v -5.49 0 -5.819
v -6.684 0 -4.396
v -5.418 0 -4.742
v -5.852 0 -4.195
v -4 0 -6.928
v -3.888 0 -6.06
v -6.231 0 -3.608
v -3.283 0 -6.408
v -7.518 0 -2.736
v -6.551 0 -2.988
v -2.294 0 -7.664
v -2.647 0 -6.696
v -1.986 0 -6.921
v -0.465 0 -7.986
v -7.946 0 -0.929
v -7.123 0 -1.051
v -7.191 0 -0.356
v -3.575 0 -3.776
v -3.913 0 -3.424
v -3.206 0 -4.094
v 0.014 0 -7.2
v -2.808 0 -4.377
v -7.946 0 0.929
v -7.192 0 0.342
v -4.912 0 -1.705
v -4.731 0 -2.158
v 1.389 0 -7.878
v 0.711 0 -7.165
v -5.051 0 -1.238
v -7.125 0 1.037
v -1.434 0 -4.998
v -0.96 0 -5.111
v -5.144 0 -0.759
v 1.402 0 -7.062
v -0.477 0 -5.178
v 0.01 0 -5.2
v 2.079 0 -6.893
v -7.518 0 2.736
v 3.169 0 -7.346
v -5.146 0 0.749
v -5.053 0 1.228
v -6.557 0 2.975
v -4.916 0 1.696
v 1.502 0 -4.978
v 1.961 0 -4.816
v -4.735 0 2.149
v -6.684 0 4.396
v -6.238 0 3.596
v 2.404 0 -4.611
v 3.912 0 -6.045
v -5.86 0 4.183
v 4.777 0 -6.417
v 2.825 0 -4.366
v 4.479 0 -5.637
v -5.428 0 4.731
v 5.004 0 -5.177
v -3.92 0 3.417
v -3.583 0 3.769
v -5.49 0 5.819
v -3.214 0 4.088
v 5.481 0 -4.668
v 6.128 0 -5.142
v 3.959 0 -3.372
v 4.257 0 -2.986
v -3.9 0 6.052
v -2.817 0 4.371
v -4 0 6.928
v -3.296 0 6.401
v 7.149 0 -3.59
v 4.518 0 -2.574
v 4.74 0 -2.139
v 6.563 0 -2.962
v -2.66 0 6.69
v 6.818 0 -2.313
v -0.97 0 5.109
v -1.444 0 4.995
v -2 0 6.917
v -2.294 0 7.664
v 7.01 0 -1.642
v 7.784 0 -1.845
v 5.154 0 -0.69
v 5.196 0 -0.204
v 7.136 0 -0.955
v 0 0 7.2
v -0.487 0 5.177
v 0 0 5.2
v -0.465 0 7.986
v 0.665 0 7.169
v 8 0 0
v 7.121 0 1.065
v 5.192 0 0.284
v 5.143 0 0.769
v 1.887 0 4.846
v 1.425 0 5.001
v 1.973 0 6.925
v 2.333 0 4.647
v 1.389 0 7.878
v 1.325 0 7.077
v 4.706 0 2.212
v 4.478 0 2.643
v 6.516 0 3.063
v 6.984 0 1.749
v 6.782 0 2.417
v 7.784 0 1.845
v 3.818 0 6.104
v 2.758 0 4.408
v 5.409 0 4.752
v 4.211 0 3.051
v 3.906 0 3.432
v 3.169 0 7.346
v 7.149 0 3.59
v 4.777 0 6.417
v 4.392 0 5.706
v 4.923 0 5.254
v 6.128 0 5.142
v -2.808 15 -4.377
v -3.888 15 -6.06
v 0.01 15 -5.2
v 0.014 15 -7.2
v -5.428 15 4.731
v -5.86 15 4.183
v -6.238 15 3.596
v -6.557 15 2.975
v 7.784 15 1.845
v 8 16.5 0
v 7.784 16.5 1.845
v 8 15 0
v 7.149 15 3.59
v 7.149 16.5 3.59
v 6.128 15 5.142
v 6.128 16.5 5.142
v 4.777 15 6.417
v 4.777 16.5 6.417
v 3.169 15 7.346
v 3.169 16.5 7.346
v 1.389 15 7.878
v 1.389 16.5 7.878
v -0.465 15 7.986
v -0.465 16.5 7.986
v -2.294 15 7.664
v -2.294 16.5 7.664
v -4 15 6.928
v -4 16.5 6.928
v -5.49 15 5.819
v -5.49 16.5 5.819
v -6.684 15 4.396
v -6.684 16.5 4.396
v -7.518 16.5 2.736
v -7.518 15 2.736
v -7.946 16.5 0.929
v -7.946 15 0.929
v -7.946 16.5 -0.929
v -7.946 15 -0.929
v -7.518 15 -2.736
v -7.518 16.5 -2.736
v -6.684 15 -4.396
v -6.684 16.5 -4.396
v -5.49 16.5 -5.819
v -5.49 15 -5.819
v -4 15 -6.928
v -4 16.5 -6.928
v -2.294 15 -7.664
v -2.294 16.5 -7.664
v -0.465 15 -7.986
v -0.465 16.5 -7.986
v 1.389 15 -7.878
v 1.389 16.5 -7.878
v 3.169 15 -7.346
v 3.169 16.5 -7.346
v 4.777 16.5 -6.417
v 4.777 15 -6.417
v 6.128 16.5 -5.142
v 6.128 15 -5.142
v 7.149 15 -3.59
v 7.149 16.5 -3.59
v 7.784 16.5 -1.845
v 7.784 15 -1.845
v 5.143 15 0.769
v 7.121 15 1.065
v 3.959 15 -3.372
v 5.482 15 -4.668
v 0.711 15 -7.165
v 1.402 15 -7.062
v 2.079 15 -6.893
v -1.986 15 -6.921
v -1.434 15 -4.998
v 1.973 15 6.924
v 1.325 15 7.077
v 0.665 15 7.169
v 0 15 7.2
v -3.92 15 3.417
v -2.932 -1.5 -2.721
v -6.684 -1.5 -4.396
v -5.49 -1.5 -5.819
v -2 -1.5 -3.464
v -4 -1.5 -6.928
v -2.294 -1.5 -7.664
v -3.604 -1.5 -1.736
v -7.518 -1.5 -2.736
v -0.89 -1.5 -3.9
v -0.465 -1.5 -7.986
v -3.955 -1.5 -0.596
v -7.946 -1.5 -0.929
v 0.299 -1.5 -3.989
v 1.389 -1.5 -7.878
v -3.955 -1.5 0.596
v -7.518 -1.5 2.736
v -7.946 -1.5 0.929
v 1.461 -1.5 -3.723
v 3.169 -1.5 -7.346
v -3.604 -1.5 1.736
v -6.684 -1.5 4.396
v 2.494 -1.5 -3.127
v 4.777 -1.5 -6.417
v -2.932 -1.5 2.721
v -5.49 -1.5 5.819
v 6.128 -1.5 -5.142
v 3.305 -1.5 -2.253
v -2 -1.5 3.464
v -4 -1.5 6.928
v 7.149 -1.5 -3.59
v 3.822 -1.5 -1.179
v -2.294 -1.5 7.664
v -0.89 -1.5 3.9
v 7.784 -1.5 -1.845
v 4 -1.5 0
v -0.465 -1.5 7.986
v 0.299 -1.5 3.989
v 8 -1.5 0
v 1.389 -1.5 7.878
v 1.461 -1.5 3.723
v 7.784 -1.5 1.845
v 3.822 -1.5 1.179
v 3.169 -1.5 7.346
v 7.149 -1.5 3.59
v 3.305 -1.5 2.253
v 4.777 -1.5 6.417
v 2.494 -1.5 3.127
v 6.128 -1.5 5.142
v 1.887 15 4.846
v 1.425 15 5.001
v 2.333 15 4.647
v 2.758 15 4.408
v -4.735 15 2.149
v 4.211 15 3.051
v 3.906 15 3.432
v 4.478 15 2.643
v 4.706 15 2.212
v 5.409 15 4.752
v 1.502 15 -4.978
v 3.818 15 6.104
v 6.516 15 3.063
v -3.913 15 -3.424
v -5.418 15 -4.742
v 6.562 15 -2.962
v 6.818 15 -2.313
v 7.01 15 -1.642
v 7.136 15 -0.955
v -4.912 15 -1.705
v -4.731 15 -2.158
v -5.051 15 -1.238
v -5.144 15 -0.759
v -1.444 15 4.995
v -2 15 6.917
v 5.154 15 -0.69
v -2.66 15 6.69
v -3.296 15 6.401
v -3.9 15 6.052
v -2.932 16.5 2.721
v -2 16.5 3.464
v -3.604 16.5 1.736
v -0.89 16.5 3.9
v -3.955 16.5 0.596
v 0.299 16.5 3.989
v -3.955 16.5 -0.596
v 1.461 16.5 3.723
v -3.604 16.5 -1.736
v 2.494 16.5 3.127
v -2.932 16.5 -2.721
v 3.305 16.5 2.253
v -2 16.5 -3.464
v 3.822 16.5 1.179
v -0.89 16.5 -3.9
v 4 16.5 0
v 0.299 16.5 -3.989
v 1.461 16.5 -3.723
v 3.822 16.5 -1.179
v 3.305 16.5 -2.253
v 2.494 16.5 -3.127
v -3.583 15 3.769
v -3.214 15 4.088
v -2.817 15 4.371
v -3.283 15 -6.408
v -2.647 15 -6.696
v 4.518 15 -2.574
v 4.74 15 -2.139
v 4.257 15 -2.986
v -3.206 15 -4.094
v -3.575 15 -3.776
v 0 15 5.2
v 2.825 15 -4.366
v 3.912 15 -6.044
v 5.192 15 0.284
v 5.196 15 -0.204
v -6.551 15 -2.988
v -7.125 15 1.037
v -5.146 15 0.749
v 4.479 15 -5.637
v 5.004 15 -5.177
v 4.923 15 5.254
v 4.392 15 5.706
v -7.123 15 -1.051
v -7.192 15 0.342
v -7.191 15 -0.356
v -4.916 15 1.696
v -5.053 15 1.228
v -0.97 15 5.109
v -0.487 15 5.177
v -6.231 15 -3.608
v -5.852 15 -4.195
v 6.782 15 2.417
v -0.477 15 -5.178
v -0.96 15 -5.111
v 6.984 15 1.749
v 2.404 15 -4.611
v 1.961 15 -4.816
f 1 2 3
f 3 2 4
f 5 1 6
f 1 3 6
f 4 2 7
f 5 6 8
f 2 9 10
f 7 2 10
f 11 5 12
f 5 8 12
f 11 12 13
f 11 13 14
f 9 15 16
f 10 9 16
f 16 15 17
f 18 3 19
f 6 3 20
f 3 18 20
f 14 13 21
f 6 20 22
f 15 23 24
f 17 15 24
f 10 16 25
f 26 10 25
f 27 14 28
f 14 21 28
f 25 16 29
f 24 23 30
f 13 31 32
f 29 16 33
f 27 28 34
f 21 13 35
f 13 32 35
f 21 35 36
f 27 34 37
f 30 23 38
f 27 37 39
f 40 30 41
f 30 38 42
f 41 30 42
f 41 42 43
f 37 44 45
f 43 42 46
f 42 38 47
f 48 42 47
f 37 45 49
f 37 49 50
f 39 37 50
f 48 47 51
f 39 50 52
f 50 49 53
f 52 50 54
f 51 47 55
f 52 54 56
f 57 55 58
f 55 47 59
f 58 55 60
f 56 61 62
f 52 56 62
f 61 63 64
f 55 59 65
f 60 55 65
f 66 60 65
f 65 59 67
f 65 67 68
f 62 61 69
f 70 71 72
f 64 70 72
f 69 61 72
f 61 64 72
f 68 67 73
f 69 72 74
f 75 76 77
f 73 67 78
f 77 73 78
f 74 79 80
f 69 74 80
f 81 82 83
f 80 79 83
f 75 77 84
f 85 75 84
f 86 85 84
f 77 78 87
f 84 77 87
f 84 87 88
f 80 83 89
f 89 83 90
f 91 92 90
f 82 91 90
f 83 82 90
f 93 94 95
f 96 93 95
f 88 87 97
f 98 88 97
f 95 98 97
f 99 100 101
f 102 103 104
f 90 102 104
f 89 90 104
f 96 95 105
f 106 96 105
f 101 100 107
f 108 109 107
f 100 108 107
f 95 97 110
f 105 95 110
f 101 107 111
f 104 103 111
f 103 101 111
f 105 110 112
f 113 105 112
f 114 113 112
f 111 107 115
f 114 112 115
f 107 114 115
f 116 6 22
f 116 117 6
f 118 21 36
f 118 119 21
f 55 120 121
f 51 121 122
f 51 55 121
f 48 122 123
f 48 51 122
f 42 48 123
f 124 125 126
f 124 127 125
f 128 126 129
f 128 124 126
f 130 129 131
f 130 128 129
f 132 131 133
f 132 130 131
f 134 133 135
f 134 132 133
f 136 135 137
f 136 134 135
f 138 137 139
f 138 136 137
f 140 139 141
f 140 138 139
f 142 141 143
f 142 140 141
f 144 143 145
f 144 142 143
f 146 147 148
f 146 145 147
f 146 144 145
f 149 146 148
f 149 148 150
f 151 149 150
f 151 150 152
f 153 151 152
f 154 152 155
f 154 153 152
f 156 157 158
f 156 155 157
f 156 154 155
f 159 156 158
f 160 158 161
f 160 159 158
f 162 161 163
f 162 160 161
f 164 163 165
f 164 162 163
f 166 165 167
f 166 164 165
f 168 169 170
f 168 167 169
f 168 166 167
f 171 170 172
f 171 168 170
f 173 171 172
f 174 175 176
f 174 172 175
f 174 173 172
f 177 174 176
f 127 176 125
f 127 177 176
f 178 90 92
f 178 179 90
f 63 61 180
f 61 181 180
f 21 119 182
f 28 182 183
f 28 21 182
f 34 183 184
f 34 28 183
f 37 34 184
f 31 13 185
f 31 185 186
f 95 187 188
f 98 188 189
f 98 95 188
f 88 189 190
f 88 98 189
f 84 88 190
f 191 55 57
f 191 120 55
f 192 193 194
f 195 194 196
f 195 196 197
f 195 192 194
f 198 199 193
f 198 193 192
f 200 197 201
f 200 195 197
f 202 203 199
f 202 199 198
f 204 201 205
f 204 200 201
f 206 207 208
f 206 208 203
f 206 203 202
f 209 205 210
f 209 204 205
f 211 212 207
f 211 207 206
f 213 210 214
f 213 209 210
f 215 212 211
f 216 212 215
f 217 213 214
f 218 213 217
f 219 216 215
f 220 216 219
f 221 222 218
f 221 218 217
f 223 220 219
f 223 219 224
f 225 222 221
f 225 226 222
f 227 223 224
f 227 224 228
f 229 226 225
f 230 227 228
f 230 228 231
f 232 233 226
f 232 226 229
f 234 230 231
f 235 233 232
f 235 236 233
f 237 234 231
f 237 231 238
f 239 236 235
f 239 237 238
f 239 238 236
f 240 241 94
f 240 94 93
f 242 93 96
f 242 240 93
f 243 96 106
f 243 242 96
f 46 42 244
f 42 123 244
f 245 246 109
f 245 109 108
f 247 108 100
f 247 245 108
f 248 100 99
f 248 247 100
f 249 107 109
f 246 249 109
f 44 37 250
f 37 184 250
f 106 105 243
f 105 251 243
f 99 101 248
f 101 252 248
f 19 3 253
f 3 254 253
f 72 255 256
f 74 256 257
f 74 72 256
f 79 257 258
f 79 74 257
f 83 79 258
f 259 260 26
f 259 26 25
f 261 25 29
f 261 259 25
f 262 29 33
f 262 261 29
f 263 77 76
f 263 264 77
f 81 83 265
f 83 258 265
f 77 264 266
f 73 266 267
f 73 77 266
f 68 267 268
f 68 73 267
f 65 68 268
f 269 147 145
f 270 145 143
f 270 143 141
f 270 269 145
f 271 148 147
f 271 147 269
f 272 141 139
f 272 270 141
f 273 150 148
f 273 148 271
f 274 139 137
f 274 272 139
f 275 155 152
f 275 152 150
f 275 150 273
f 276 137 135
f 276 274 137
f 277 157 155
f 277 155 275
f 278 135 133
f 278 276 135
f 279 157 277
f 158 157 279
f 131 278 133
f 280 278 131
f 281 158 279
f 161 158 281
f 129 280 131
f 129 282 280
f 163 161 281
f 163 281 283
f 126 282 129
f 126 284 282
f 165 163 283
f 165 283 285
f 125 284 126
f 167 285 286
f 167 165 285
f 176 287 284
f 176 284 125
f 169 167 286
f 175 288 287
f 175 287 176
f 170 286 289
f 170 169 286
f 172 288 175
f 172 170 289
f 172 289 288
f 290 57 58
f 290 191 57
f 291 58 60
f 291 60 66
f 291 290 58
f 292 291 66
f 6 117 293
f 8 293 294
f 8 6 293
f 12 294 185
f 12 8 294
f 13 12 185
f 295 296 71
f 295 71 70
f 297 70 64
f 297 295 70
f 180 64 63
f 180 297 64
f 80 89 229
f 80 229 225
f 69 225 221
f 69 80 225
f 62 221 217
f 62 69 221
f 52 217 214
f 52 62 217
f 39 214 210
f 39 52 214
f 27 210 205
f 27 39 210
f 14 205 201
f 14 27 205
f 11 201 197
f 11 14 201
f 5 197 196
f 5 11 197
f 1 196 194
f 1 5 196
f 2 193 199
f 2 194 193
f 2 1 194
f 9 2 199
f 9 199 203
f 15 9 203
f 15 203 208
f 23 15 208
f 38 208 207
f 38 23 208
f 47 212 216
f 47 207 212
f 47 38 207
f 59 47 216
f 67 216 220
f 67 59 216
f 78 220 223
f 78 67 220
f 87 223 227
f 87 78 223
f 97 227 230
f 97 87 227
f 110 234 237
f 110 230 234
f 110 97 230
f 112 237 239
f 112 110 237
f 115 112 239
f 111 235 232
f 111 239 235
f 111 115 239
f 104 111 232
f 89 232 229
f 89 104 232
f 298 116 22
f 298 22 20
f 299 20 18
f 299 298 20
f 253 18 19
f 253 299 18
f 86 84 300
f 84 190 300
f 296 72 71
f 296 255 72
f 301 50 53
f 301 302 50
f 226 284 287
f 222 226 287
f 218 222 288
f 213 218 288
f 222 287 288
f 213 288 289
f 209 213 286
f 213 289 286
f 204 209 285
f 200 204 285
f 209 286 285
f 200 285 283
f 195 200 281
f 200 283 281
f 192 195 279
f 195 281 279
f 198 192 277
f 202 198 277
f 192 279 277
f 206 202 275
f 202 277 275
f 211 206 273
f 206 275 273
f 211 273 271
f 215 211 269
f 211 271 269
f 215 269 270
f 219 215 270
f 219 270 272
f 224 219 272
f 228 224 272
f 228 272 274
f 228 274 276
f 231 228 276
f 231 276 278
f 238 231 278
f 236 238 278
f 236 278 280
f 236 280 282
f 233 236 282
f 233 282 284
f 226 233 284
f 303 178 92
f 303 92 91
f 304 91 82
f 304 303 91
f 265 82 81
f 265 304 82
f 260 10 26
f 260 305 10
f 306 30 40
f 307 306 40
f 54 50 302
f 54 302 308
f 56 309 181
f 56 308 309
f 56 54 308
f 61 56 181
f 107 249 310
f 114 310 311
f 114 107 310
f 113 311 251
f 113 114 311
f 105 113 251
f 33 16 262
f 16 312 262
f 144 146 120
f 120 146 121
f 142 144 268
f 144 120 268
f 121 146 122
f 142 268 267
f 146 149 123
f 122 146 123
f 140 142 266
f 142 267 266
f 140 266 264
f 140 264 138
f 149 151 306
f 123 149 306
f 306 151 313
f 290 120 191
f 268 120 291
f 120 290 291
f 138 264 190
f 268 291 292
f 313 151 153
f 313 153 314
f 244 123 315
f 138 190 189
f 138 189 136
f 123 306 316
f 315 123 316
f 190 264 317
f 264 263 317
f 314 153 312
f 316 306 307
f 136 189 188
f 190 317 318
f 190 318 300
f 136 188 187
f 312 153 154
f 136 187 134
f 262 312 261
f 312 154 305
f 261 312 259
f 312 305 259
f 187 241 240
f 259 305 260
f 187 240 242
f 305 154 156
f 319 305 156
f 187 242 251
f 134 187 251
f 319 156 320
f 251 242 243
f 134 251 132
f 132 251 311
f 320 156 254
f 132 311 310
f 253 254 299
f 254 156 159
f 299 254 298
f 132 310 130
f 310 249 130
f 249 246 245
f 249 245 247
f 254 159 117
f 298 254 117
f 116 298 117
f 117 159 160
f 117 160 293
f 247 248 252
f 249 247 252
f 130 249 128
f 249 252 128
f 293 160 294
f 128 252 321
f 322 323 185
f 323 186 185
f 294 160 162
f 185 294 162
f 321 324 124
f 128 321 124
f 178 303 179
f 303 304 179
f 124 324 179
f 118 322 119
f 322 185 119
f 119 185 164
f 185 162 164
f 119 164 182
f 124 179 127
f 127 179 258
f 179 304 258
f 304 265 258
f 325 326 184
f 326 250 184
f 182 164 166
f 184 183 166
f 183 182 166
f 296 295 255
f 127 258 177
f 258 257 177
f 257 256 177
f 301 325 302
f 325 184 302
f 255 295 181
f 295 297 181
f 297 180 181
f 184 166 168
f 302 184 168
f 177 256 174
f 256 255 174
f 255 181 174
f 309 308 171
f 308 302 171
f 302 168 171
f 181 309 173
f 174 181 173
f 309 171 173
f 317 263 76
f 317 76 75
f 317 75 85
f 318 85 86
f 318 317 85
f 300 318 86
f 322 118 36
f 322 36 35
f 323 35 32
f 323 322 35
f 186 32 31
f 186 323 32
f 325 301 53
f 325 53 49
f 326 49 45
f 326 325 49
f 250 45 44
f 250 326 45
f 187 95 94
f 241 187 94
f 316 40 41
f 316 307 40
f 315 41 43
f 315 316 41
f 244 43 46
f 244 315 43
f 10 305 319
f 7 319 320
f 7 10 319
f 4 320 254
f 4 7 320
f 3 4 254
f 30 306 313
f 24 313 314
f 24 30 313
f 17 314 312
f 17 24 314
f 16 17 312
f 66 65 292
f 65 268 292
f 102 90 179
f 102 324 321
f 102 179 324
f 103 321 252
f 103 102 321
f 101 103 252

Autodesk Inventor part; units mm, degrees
ref_plane "YZ Plane" through (0, 0, 0) normal (1, 0, 0) x (0, 1, 0)
ref_plane "XZ Plane" through (0, 0, 0) normal (0, 1, 0) x (-1, 0, 0)
ref_plane "XY Plane" through (0, 0, 0) normal (0, 0, 1) x (1, 0, 0)
sketch "Esquisse2" plane through (0, 0, 0) normal (0, 1, 0) x (-1, 0, 0)
  circle A0 centre (0, 0) radius 7.2
  dimension "d0" = 14.4
extrude "Extrusion1" add sketch "Esquisse2" along normal blind 15
sketch "Esquisse4" plane through (0, 15, 0) normal (0, 1, 0) x (1, 0, 0)
  circle A0 centre (0, 0) radius 7.2 projected
  circle A1 centre (0, 0) radius 7.2 projected
  arc A2 (-2, -6.9166) -> (0, -7.2) centre (0, 0) ccw
  arc A3 (-1.4444, -4.9954) -> (0, -5.2) centre (0, 0) ccw
  line L0 (-2, -6.9166) -> (-1.4444, -4.9954)
  line L1 (0, -7.2) -> (0, -5.2)
  line L2 (0, 0) -> (-4.1531, -9.129)
  arc A4 (-5.4277, -4.7308) -> (-3.9, -6.0523) centre (0, 0) ccw
  arc A5 (-3.92, -3.4167) -> (-2.8167, -4.3711) centre (0, 0) ccw
  line L3 (-3.9, -6.0523) -> (-2.8167, -4.3711)
  line L4 (-5.4277, -4.7308) -> (-3.92, -3.4167)
  line L5 (0, -6) -> (0, 5.5969) construction
  line L6 (0, 0) -> (-5.5895, -3.594)
  arc A6 (-6.5507, 2.988) -> (-7.1229, 1.0507) centre (0, 0) ccw
  arc A7 (-4.7311, 2.158) -> (-5.1443, 0.7589) centre (0, 0) ccw
  line L7 (-7.1229, 1.0507) -> (-5.1443, 0.7589)
  line L8 (-6.5507, 2.988) -> (-4.7311, 2.158)
  arc A8 (-7.125, -1.0366) -> (-6.5566, -2.975) centre (0, 0) ccw
  arc A9 (-5.1458, -0.7487) -> (-4.7353, -2.1486) centre (0, 0) ccw
  line L9 (-7.125, -1.0366) -> (-5.1458, -0.7487)
  line L10 (-6.5566, -2.975) -> (-4.7353, -2.1486)
  line L11 (-2, -6.9166) -> (-3.9, -6.0523) construction
  line L12 (-5.4277, -4.7308) -> (-6.5566, -2.975) construction
  line L13 (-2, -6.9166) -> (0, -7.2) construction
  line L14 (0, 0) -> (-5.7368, 3.7048)
  arc A10 (-3.888, 6.06) -> (-5.4183, 4.7415) centre (0, 0) ccw
  line L15 (-5.4183, 4.7415) -> (-3.9132, 3.4244)
  line L16 (-3.888, 6.06) -> (-2.808, 4.3767)
  arc A11 (-2.808, 4.3767) -> (-3.9132, 3.4244) centre (0, 0) ccw
  line L17 (-1.9863, 6.9206) -> (-1.4345, 4.9982)
  arc A12 (0.0143, 7.2) -> (-1.9863, 6.9206) centre (0, 0) ccw
  arc A13 (0.0103, 5.2) -> (-1.4345, 4.9982) centre (0, 0) ccw
  line L18 (0.0143, 7.2) -> (0.0103, 5.2)
  line L19 (-6.5507, 2.988) -> (-5.4183, 4.7415) construction
  line L20 (0, 0) -> (1.7786, 11.975)
  arc A14 (1.9726, -6.9245) -> (3.8184, -6.1041) centre (0, 0) ccw
  arc A15 (1.4246, -5.001) -> (2.7578, -4.4085) centre (0, 0) ccw
  line L21 (1.9726, -6.9245) -> (1.4246, -5.001)
  line L22 (3.8184, -6.1041) -> (2.7578, -4.4085)
  arc A16 (7.1208, -1.0648) -> (7.1364, 0.9551) centre (0, 0) ccw
  line L23 (7.1364, 0.9551) -> (5.154, 0.6898)
  line L24 (7.1208, -1.0648) -> (5.1428, -0.7691)
  arc A17 (5.1428, -0.7691) -> (5.154, 0.6898) centre (0, 0) ccw
  line L25 (6.5161, -3.0627) -> (4.7061, -2.212)
  arc A18 (5.4089, -4.7522) -> (6.5161, -3.0627) centre (0, 0) ccw
  arc A19 (3.9064, -3.4322) -> (4.7061, -2.212) centre (0, 0) ccw
  line L26 (5.4089, -4.7522) -> (3.9064, -3.4322)
  line L27 (3.8184, -6.1041) -> (5.4089, -4.7522) construction
  line L28 (2.079, 6.8933) -> (1.5015, 4.9785)
  arc A20 (2.8253, 4.3655) -> (1.5015, 4.9785) centre (0, 0) ccw
  line L29 (3.912, 6.0445) -> (2.8253, 4.3655)
  arc A21 (3.912, 6.0445) -> (2.079, 6.8933) centre (0, 0) ccw
  arc A22 (4.7396, 2.1392) -> (3.9588, 3.3716) centre (0, 0) ccw
  line L30 (5.4815, 4.6684) -> (3.9588, 3.3716)
  line L31 (6.5625, 2.962) -> (4.7396, 2.1392)
  arc A23 (6.5625, 2.962) -> (5.4815, 4.6684) centre (0, 0) ccw
  line L32 (7.1364, 0.9551) -> (6.5625, 2.962) construction
  line L33 (0.0143, 7.2) -> (2.079, 6.8933) construction
  point P0 (3.8184, -6.1041)
  point P1 (6.5161, -3.0627)
  point P2 (7.1208, -1.0648)
  point P3 (7.1364, 0.9551)
  point P4 (5.4815, 4.6684)
  point P5 (2.079, 6.8933)
  point P6 (-6.5507, 2.988)
  point P7 (-7.1229, 1.0507)
  point P8 (-6.5566, -2.975)
  point P9 (-2, -6.9166)
  point P10 (0, -7.2)
  point P11 (-5.4277, -4.7308)
  point P12 (-3.9, -6.0523)
  dimension "d13" = 2
  dimension "d14" = 2
  dimension "d16" = 1.9
extrude "Extrusion2" cut sketch "Esquisse4" against normal through all contours A0 L24 A17 L23 | L31 A22 L30 A0 | A0 L26 A19 L25 | L29 A20 L28 A0 | A0 L21 A15 L22 | A0 L0 A3 L1 | L18 A13 L17 A0 | L16 A11 L15 A0 | A0 L4 A5 L3 | L8 A7 L7 A0 | A0 L9 A9 L10
sketch "Esquisse5" plane through (0, 15, 0) normal (0, 1, 0) x (1, 0, 0)
  point P0 (0, 0)
sketch "Esquisse6" plane through (0, 15, 0) normal (0, 1, 0) x (1, 0, 0)
  circle A0 centre (0, 0) radius 8
  dimension "d19" = 16
extrude "Extrusion3" add sketch "Esquisse6" along normal blind 1.5
sketch "Esquisse7" plane through (0, 0, 0) normal (0, -1, 0) x (1, 0, 0)
  circle A0 centre (0, 0) radius 8
extrude "Extrusion4" add sketch "Esquisse7" along normal blind 1.5
sketch "Esquisse8" plane through (0, 16.5, 0) normal (0, 1, 0) x (1, 0, 0)
  circle A0 centre (0, 0) radius 4
  dimension "d24" = 8
extrude "Extrusion5" cut sketch "Esquisse8" against normal through all
properties part number "Pièce_moteur_courroie_test_1"
